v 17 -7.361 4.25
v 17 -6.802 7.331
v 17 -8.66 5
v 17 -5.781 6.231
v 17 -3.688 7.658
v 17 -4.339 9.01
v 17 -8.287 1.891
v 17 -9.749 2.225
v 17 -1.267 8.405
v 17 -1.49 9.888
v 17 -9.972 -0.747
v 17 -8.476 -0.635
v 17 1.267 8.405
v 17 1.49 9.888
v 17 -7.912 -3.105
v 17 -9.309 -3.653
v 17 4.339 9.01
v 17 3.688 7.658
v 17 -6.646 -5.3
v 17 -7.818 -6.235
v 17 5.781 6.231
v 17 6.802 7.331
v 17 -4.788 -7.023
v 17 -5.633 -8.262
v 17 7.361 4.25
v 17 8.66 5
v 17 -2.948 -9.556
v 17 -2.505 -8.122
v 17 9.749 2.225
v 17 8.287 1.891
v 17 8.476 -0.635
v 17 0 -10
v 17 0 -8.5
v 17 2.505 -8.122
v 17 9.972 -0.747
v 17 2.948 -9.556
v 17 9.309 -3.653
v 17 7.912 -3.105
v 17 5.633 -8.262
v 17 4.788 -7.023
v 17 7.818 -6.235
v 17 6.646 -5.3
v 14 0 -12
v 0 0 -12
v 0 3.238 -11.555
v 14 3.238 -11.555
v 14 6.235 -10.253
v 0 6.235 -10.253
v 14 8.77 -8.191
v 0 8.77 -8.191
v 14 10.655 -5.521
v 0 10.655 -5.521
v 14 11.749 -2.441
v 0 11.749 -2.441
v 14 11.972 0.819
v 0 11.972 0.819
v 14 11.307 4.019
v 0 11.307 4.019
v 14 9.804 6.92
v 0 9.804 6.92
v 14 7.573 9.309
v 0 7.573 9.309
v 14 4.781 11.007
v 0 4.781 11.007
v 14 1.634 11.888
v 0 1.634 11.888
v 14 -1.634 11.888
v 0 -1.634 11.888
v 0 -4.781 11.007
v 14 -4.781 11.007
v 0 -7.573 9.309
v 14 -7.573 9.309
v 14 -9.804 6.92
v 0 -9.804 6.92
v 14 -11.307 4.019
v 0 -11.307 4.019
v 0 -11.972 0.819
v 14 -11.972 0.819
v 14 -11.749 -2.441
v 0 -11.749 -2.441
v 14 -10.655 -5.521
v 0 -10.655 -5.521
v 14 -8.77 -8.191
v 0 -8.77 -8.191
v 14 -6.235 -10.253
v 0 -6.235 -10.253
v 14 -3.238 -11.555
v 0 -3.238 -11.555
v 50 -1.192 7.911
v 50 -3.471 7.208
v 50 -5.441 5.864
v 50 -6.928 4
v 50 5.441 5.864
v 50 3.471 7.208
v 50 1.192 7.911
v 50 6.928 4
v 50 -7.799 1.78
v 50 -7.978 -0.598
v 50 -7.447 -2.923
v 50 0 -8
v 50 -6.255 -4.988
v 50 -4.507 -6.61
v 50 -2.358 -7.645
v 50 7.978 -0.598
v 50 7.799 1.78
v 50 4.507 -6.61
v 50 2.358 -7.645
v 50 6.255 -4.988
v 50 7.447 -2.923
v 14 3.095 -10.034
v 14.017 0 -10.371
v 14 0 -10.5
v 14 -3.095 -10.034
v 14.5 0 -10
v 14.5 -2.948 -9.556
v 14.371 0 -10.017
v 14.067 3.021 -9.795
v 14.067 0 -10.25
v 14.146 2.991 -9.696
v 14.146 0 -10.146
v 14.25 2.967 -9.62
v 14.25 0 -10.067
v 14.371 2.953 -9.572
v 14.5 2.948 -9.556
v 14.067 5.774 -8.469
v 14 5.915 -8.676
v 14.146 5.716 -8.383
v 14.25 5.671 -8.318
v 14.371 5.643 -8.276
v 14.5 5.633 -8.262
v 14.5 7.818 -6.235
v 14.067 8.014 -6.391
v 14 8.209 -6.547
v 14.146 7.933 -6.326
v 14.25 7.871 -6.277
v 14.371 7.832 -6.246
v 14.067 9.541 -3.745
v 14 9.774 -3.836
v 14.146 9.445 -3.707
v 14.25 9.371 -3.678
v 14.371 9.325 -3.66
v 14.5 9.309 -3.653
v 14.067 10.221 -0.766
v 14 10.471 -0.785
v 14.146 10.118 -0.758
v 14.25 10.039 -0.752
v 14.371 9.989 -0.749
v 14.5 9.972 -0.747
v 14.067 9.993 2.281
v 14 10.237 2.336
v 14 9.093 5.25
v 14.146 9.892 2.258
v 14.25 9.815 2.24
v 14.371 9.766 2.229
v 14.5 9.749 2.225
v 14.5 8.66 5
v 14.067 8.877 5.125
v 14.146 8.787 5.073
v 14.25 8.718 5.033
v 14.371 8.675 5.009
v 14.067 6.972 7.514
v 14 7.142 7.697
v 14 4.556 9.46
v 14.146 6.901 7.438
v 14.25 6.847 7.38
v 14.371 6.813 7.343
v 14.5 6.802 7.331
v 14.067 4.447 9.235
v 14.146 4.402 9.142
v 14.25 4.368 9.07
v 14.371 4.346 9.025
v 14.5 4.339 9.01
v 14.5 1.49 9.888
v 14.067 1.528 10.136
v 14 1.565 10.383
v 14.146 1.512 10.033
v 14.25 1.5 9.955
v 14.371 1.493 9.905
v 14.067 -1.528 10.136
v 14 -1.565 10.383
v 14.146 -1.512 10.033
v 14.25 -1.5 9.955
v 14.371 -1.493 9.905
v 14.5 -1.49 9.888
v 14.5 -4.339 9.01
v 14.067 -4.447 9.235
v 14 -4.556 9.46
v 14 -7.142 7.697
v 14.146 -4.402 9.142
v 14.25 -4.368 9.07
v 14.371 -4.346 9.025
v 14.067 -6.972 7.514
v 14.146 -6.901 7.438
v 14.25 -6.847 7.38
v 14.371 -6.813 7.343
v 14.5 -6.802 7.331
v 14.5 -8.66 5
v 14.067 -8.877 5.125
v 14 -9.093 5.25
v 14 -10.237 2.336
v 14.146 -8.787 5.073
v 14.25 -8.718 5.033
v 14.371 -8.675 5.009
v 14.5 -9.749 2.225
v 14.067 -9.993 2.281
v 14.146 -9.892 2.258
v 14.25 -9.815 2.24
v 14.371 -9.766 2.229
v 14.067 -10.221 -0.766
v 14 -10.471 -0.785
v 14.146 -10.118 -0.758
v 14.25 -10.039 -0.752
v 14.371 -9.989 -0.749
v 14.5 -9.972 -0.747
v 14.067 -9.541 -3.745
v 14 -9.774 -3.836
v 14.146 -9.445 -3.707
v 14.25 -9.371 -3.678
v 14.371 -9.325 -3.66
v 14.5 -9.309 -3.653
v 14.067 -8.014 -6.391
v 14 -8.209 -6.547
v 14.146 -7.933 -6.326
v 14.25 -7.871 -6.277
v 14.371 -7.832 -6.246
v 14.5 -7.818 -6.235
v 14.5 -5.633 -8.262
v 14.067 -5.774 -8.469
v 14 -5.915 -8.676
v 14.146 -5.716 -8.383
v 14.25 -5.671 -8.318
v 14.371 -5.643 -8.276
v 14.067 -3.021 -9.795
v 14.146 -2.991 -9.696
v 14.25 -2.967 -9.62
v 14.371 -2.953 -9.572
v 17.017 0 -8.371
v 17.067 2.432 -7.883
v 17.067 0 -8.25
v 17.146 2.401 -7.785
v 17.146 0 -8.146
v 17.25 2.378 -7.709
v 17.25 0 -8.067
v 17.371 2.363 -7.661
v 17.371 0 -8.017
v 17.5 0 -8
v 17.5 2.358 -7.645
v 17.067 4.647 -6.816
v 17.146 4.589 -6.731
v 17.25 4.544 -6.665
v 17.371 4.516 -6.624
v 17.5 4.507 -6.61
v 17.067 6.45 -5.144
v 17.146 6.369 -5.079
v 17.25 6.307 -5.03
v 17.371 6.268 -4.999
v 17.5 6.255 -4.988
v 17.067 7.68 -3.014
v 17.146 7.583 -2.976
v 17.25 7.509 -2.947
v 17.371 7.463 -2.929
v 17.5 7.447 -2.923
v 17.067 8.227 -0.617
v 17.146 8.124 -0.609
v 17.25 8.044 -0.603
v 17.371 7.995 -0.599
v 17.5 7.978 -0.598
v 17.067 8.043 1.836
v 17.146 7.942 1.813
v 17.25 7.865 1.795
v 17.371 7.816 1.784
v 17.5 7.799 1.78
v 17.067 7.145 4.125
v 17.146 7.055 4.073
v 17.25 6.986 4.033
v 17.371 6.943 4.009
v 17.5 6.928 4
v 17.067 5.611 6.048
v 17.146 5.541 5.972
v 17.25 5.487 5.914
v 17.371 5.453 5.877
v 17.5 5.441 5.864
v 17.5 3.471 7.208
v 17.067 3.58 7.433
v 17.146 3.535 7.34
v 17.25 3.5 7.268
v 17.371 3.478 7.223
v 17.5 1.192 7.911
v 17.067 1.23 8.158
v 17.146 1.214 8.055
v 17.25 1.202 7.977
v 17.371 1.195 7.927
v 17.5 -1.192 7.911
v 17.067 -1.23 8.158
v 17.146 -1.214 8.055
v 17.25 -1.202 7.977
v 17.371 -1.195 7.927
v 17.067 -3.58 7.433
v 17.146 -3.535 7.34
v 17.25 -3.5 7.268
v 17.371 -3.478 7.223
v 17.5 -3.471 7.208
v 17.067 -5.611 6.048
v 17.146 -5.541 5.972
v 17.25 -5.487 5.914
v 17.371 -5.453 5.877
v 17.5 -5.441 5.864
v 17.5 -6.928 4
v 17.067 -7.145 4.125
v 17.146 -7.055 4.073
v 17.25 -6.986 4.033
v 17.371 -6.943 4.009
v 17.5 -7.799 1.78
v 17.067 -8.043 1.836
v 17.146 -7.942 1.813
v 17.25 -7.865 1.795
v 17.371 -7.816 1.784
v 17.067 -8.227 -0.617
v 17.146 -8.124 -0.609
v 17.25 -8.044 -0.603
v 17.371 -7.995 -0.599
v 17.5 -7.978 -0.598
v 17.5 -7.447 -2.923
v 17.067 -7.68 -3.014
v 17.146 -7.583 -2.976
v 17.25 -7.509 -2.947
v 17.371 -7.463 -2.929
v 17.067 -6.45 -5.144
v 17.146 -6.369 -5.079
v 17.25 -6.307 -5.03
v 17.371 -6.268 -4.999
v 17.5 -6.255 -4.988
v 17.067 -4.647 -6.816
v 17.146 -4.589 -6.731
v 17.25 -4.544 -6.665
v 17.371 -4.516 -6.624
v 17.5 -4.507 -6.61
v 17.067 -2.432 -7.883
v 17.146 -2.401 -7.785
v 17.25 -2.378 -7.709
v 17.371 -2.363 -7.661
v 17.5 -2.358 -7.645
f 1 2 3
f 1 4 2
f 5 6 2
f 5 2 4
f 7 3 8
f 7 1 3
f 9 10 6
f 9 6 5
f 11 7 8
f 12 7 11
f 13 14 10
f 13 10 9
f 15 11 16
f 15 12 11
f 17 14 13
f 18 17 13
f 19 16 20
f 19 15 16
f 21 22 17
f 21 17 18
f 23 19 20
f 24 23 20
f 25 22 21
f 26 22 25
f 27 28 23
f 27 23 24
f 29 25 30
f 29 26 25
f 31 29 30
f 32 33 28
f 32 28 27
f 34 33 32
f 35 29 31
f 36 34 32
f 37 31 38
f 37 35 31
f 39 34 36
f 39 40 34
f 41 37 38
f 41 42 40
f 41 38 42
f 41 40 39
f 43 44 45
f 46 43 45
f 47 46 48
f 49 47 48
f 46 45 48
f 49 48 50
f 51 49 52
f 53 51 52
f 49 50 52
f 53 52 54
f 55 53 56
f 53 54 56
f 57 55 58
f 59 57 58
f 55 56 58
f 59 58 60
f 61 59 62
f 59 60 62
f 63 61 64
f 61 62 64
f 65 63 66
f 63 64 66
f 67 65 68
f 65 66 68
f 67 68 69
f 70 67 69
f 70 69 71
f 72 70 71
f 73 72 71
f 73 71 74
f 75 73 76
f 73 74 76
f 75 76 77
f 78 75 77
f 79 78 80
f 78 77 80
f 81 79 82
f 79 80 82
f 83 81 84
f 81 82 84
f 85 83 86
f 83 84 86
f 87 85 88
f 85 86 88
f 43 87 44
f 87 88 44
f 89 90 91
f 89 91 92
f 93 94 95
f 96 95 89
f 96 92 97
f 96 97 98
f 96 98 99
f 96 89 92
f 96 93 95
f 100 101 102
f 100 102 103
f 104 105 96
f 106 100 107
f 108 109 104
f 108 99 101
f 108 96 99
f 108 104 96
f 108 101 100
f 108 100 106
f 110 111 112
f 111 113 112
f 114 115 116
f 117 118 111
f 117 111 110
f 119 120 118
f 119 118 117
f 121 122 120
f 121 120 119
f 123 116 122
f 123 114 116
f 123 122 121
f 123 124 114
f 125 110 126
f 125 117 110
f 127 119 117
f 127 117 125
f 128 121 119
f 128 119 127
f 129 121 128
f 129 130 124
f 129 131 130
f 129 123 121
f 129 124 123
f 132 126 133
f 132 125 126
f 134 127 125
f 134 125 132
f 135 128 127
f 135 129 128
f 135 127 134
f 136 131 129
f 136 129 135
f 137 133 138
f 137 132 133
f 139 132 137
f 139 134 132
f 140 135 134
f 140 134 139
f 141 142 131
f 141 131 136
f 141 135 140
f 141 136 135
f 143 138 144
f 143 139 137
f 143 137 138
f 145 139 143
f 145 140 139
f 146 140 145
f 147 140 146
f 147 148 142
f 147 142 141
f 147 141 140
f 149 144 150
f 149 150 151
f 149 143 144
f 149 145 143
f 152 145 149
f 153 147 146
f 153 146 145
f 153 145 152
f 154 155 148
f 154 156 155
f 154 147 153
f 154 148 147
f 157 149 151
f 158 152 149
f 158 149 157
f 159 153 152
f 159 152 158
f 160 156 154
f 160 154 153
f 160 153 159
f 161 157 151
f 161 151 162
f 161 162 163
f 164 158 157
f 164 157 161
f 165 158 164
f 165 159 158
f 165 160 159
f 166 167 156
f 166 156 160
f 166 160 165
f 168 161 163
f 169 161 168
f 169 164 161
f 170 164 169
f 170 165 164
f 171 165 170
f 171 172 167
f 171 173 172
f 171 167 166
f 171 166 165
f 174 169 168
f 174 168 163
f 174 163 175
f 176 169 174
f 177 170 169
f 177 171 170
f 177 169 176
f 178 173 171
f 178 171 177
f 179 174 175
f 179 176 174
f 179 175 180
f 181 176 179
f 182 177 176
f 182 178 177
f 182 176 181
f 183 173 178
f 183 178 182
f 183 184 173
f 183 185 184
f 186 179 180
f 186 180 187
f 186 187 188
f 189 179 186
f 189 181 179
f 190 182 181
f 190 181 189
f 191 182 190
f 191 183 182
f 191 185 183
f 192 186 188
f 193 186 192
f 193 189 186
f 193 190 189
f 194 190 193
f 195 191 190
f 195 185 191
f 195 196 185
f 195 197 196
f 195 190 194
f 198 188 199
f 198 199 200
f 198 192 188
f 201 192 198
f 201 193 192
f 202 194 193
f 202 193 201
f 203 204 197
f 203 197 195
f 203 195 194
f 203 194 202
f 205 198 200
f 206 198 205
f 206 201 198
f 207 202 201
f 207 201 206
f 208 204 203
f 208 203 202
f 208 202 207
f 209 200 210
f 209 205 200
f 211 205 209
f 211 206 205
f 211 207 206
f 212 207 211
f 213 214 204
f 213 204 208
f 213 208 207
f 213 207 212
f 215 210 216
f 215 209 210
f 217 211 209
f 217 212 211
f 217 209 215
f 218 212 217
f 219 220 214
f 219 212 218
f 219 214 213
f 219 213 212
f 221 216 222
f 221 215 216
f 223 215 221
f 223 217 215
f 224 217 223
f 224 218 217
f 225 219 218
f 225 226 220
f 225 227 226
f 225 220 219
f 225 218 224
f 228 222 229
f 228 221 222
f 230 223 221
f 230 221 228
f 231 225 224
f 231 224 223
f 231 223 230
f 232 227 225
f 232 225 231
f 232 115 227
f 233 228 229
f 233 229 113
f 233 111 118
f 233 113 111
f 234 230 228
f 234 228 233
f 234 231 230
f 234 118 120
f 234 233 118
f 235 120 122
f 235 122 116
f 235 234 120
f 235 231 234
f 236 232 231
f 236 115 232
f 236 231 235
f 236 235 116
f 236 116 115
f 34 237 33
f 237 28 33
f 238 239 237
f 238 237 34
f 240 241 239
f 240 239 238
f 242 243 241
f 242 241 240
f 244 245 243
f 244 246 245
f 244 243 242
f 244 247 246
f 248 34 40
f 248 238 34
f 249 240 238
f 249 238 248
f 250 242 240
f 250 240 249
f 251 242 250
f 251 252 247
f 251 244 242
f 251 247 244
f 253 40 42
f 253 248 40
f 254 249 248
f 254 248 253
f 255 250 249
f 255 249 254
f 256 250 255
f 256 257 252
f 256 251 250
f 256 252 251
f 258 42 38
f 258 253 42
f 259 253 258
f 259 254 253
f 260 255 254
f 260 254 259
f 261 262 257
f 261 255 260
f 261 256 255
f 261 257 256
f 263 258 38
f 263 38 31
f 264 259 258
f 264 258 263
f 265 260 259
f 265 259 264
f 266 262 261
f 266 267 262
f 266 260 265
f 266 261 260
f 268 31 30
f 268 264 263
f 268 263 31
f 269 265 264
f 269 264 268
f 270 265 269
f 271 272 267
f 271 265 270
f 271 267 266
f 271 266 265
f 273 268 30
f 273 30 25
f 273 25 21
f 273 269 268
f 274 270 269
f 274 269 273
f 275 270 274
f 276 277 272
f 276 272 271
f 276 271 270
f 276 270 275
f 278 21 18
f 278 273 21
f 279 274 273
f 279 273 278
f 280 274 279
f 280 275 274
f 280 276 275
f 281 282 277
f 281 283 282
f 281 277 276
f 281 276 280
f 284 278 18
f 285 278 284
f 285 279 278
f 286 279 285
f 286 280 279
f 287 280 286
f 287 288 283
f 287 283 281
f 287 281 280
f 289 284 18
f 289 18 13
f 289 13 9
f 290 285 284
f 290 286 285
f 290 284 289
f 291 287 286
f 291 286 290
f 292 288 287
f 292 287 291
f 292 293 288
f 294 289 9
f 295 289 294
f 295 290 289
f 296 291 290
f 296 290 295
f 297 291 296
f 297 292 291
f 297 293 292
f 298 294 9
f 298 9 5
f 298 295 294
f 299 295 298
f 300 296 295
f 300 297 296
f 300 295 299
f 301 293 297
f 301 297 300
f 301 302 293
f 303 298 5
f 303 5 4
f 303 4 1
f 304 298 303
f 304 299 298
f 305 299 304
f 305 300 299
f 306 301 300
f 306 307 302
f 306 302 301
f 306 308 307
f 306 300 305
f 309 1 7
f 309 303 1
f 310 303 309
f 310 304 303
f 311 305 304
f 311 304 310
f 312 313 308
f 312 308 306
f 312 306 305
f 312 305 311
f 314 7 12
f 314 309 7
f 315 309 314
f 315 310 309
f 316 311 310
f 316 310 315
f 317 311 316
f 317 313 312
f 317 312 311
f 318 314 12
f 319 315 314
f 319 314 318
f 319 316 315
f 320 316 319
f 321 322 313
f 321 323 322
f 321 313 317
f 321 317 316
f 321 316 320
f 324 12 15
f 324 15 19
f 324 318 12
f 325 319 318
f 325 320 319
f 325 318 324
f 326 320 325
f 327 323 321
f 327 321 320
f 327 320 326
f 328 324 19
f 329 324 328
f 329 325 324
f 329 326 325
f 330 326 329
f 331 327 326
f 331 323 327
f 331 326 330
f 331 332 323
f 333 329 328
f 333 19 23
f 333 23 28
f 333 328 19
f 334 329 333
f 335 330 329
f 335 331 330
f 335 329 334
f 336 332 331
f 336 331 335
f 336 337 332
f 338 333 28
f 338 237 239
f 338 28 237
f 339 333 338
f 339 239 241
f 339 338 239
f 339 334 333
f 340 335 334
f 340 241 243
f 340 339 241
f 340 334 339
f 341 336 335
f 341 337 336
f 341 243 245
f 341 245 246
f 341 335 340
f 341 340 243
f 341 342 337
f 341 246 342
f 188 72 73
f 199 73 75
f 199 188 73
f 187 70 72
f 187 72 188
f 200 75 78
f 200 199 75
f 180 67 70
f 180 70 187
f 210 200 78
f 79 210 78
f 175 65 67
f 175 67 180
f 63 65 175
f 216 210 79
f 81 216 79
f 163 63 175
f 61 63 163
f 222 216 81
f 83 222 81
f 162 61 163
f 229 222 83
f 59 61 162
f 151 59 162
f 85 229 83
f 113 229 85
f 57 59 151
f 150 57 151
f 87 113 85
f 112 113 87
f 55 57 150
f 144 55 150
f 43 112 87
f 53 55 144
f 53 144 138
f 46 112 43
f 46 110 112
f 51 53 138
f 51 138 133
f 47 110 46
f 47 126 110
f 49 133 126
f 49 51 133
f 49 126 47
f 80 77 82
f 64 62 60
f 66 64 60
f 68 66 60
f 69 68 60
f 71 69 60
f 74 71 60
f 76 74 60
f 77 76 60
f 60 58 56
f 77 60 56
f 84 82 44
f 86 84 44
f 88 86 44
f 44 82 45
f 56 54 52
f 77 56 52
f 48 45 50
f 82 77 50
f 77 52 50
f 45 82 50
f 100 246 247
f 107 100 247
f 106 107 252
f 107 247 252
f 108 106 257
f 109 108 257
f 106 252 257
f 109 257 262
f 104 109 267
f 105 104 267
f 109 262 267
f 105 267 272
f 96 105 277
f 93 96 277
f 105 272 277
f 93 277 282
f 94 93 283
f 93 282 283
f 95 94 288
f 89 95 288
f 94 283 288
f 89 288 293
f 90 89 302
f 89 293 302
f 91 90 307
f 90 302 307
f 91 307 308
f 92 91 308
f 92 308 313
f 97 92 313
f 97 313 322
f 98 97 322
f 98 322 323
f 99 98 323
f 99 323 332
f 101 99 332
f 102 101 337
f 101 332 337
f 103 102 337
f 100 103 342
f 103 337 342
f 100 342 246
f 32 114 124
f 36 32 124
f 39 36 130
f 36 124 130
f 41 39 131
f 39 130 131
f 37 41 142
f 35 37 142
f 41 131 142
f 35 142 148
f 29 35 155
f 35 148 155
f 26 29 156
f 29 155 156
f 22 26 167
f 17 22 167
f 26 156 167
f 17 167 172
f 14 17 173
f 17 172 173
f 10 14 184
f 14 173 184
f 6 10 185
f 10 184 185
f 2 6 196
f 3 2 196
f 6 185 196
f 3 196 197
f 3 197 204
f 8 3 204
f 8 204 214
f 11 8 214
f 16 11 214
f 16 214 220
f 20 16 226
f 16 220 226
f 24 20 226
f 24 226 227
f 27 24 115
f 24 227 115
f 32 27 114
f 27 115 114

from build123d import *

# Parameters (mm, degrees)
SKETCH1_R           = 12
BOSS_EXTRUDE1_DEPTH = 14
SKETCH2_R           = 10
BOSS_EXTRUDE2_DEPTH = 3
SKETCH3_R           = 8
BOSS_EXTRUDE3_DEPTH = 33
FILLET1_R           = 0.5


with BuildPart() as part:
    # Sketch1 → Boss-Extrude1 (new body)
    with BuildSketch(Plane(origin=(0, 0, 0), x_dir=(0, 0, -1), z_dir=(1, 0, 0))):
        Circle(SKETCH1_R)
    extrude(amount=BOSS_EXTRUDE1_DEPTH)

    # Sketch2 → Boss-Extrude2 (add)
    with BuildSketch(Plane(origin=(14, 0, 0), x_dir=(0, 0, -1), z_dir=(1, 0, 0))):
        Circle(SKETCH2_R)
    extrude(amount=BOSS_EXTRUDE2_DEPTH)

    # Sketch3 → Boss-Extrude3 (add)
    with BuildSketch(Plane(origin=(17, 0, 0), x_dir=(0, 0, -1), z_dir=(1, 0, 0))):
        Circle(SKETCH3_R)
    extrude(amount=BOSS_EXTRUDE3_DEPTH)

    # Fillet1
    fillet1_edges = [part.edges().sort_by_distance(p)[0] for p in [
        (17, 0, 8),
        (14, 0, 10),
    ]]
    fillet(fillet1_edges, radius=FILLET1_R)


solid = part.part
